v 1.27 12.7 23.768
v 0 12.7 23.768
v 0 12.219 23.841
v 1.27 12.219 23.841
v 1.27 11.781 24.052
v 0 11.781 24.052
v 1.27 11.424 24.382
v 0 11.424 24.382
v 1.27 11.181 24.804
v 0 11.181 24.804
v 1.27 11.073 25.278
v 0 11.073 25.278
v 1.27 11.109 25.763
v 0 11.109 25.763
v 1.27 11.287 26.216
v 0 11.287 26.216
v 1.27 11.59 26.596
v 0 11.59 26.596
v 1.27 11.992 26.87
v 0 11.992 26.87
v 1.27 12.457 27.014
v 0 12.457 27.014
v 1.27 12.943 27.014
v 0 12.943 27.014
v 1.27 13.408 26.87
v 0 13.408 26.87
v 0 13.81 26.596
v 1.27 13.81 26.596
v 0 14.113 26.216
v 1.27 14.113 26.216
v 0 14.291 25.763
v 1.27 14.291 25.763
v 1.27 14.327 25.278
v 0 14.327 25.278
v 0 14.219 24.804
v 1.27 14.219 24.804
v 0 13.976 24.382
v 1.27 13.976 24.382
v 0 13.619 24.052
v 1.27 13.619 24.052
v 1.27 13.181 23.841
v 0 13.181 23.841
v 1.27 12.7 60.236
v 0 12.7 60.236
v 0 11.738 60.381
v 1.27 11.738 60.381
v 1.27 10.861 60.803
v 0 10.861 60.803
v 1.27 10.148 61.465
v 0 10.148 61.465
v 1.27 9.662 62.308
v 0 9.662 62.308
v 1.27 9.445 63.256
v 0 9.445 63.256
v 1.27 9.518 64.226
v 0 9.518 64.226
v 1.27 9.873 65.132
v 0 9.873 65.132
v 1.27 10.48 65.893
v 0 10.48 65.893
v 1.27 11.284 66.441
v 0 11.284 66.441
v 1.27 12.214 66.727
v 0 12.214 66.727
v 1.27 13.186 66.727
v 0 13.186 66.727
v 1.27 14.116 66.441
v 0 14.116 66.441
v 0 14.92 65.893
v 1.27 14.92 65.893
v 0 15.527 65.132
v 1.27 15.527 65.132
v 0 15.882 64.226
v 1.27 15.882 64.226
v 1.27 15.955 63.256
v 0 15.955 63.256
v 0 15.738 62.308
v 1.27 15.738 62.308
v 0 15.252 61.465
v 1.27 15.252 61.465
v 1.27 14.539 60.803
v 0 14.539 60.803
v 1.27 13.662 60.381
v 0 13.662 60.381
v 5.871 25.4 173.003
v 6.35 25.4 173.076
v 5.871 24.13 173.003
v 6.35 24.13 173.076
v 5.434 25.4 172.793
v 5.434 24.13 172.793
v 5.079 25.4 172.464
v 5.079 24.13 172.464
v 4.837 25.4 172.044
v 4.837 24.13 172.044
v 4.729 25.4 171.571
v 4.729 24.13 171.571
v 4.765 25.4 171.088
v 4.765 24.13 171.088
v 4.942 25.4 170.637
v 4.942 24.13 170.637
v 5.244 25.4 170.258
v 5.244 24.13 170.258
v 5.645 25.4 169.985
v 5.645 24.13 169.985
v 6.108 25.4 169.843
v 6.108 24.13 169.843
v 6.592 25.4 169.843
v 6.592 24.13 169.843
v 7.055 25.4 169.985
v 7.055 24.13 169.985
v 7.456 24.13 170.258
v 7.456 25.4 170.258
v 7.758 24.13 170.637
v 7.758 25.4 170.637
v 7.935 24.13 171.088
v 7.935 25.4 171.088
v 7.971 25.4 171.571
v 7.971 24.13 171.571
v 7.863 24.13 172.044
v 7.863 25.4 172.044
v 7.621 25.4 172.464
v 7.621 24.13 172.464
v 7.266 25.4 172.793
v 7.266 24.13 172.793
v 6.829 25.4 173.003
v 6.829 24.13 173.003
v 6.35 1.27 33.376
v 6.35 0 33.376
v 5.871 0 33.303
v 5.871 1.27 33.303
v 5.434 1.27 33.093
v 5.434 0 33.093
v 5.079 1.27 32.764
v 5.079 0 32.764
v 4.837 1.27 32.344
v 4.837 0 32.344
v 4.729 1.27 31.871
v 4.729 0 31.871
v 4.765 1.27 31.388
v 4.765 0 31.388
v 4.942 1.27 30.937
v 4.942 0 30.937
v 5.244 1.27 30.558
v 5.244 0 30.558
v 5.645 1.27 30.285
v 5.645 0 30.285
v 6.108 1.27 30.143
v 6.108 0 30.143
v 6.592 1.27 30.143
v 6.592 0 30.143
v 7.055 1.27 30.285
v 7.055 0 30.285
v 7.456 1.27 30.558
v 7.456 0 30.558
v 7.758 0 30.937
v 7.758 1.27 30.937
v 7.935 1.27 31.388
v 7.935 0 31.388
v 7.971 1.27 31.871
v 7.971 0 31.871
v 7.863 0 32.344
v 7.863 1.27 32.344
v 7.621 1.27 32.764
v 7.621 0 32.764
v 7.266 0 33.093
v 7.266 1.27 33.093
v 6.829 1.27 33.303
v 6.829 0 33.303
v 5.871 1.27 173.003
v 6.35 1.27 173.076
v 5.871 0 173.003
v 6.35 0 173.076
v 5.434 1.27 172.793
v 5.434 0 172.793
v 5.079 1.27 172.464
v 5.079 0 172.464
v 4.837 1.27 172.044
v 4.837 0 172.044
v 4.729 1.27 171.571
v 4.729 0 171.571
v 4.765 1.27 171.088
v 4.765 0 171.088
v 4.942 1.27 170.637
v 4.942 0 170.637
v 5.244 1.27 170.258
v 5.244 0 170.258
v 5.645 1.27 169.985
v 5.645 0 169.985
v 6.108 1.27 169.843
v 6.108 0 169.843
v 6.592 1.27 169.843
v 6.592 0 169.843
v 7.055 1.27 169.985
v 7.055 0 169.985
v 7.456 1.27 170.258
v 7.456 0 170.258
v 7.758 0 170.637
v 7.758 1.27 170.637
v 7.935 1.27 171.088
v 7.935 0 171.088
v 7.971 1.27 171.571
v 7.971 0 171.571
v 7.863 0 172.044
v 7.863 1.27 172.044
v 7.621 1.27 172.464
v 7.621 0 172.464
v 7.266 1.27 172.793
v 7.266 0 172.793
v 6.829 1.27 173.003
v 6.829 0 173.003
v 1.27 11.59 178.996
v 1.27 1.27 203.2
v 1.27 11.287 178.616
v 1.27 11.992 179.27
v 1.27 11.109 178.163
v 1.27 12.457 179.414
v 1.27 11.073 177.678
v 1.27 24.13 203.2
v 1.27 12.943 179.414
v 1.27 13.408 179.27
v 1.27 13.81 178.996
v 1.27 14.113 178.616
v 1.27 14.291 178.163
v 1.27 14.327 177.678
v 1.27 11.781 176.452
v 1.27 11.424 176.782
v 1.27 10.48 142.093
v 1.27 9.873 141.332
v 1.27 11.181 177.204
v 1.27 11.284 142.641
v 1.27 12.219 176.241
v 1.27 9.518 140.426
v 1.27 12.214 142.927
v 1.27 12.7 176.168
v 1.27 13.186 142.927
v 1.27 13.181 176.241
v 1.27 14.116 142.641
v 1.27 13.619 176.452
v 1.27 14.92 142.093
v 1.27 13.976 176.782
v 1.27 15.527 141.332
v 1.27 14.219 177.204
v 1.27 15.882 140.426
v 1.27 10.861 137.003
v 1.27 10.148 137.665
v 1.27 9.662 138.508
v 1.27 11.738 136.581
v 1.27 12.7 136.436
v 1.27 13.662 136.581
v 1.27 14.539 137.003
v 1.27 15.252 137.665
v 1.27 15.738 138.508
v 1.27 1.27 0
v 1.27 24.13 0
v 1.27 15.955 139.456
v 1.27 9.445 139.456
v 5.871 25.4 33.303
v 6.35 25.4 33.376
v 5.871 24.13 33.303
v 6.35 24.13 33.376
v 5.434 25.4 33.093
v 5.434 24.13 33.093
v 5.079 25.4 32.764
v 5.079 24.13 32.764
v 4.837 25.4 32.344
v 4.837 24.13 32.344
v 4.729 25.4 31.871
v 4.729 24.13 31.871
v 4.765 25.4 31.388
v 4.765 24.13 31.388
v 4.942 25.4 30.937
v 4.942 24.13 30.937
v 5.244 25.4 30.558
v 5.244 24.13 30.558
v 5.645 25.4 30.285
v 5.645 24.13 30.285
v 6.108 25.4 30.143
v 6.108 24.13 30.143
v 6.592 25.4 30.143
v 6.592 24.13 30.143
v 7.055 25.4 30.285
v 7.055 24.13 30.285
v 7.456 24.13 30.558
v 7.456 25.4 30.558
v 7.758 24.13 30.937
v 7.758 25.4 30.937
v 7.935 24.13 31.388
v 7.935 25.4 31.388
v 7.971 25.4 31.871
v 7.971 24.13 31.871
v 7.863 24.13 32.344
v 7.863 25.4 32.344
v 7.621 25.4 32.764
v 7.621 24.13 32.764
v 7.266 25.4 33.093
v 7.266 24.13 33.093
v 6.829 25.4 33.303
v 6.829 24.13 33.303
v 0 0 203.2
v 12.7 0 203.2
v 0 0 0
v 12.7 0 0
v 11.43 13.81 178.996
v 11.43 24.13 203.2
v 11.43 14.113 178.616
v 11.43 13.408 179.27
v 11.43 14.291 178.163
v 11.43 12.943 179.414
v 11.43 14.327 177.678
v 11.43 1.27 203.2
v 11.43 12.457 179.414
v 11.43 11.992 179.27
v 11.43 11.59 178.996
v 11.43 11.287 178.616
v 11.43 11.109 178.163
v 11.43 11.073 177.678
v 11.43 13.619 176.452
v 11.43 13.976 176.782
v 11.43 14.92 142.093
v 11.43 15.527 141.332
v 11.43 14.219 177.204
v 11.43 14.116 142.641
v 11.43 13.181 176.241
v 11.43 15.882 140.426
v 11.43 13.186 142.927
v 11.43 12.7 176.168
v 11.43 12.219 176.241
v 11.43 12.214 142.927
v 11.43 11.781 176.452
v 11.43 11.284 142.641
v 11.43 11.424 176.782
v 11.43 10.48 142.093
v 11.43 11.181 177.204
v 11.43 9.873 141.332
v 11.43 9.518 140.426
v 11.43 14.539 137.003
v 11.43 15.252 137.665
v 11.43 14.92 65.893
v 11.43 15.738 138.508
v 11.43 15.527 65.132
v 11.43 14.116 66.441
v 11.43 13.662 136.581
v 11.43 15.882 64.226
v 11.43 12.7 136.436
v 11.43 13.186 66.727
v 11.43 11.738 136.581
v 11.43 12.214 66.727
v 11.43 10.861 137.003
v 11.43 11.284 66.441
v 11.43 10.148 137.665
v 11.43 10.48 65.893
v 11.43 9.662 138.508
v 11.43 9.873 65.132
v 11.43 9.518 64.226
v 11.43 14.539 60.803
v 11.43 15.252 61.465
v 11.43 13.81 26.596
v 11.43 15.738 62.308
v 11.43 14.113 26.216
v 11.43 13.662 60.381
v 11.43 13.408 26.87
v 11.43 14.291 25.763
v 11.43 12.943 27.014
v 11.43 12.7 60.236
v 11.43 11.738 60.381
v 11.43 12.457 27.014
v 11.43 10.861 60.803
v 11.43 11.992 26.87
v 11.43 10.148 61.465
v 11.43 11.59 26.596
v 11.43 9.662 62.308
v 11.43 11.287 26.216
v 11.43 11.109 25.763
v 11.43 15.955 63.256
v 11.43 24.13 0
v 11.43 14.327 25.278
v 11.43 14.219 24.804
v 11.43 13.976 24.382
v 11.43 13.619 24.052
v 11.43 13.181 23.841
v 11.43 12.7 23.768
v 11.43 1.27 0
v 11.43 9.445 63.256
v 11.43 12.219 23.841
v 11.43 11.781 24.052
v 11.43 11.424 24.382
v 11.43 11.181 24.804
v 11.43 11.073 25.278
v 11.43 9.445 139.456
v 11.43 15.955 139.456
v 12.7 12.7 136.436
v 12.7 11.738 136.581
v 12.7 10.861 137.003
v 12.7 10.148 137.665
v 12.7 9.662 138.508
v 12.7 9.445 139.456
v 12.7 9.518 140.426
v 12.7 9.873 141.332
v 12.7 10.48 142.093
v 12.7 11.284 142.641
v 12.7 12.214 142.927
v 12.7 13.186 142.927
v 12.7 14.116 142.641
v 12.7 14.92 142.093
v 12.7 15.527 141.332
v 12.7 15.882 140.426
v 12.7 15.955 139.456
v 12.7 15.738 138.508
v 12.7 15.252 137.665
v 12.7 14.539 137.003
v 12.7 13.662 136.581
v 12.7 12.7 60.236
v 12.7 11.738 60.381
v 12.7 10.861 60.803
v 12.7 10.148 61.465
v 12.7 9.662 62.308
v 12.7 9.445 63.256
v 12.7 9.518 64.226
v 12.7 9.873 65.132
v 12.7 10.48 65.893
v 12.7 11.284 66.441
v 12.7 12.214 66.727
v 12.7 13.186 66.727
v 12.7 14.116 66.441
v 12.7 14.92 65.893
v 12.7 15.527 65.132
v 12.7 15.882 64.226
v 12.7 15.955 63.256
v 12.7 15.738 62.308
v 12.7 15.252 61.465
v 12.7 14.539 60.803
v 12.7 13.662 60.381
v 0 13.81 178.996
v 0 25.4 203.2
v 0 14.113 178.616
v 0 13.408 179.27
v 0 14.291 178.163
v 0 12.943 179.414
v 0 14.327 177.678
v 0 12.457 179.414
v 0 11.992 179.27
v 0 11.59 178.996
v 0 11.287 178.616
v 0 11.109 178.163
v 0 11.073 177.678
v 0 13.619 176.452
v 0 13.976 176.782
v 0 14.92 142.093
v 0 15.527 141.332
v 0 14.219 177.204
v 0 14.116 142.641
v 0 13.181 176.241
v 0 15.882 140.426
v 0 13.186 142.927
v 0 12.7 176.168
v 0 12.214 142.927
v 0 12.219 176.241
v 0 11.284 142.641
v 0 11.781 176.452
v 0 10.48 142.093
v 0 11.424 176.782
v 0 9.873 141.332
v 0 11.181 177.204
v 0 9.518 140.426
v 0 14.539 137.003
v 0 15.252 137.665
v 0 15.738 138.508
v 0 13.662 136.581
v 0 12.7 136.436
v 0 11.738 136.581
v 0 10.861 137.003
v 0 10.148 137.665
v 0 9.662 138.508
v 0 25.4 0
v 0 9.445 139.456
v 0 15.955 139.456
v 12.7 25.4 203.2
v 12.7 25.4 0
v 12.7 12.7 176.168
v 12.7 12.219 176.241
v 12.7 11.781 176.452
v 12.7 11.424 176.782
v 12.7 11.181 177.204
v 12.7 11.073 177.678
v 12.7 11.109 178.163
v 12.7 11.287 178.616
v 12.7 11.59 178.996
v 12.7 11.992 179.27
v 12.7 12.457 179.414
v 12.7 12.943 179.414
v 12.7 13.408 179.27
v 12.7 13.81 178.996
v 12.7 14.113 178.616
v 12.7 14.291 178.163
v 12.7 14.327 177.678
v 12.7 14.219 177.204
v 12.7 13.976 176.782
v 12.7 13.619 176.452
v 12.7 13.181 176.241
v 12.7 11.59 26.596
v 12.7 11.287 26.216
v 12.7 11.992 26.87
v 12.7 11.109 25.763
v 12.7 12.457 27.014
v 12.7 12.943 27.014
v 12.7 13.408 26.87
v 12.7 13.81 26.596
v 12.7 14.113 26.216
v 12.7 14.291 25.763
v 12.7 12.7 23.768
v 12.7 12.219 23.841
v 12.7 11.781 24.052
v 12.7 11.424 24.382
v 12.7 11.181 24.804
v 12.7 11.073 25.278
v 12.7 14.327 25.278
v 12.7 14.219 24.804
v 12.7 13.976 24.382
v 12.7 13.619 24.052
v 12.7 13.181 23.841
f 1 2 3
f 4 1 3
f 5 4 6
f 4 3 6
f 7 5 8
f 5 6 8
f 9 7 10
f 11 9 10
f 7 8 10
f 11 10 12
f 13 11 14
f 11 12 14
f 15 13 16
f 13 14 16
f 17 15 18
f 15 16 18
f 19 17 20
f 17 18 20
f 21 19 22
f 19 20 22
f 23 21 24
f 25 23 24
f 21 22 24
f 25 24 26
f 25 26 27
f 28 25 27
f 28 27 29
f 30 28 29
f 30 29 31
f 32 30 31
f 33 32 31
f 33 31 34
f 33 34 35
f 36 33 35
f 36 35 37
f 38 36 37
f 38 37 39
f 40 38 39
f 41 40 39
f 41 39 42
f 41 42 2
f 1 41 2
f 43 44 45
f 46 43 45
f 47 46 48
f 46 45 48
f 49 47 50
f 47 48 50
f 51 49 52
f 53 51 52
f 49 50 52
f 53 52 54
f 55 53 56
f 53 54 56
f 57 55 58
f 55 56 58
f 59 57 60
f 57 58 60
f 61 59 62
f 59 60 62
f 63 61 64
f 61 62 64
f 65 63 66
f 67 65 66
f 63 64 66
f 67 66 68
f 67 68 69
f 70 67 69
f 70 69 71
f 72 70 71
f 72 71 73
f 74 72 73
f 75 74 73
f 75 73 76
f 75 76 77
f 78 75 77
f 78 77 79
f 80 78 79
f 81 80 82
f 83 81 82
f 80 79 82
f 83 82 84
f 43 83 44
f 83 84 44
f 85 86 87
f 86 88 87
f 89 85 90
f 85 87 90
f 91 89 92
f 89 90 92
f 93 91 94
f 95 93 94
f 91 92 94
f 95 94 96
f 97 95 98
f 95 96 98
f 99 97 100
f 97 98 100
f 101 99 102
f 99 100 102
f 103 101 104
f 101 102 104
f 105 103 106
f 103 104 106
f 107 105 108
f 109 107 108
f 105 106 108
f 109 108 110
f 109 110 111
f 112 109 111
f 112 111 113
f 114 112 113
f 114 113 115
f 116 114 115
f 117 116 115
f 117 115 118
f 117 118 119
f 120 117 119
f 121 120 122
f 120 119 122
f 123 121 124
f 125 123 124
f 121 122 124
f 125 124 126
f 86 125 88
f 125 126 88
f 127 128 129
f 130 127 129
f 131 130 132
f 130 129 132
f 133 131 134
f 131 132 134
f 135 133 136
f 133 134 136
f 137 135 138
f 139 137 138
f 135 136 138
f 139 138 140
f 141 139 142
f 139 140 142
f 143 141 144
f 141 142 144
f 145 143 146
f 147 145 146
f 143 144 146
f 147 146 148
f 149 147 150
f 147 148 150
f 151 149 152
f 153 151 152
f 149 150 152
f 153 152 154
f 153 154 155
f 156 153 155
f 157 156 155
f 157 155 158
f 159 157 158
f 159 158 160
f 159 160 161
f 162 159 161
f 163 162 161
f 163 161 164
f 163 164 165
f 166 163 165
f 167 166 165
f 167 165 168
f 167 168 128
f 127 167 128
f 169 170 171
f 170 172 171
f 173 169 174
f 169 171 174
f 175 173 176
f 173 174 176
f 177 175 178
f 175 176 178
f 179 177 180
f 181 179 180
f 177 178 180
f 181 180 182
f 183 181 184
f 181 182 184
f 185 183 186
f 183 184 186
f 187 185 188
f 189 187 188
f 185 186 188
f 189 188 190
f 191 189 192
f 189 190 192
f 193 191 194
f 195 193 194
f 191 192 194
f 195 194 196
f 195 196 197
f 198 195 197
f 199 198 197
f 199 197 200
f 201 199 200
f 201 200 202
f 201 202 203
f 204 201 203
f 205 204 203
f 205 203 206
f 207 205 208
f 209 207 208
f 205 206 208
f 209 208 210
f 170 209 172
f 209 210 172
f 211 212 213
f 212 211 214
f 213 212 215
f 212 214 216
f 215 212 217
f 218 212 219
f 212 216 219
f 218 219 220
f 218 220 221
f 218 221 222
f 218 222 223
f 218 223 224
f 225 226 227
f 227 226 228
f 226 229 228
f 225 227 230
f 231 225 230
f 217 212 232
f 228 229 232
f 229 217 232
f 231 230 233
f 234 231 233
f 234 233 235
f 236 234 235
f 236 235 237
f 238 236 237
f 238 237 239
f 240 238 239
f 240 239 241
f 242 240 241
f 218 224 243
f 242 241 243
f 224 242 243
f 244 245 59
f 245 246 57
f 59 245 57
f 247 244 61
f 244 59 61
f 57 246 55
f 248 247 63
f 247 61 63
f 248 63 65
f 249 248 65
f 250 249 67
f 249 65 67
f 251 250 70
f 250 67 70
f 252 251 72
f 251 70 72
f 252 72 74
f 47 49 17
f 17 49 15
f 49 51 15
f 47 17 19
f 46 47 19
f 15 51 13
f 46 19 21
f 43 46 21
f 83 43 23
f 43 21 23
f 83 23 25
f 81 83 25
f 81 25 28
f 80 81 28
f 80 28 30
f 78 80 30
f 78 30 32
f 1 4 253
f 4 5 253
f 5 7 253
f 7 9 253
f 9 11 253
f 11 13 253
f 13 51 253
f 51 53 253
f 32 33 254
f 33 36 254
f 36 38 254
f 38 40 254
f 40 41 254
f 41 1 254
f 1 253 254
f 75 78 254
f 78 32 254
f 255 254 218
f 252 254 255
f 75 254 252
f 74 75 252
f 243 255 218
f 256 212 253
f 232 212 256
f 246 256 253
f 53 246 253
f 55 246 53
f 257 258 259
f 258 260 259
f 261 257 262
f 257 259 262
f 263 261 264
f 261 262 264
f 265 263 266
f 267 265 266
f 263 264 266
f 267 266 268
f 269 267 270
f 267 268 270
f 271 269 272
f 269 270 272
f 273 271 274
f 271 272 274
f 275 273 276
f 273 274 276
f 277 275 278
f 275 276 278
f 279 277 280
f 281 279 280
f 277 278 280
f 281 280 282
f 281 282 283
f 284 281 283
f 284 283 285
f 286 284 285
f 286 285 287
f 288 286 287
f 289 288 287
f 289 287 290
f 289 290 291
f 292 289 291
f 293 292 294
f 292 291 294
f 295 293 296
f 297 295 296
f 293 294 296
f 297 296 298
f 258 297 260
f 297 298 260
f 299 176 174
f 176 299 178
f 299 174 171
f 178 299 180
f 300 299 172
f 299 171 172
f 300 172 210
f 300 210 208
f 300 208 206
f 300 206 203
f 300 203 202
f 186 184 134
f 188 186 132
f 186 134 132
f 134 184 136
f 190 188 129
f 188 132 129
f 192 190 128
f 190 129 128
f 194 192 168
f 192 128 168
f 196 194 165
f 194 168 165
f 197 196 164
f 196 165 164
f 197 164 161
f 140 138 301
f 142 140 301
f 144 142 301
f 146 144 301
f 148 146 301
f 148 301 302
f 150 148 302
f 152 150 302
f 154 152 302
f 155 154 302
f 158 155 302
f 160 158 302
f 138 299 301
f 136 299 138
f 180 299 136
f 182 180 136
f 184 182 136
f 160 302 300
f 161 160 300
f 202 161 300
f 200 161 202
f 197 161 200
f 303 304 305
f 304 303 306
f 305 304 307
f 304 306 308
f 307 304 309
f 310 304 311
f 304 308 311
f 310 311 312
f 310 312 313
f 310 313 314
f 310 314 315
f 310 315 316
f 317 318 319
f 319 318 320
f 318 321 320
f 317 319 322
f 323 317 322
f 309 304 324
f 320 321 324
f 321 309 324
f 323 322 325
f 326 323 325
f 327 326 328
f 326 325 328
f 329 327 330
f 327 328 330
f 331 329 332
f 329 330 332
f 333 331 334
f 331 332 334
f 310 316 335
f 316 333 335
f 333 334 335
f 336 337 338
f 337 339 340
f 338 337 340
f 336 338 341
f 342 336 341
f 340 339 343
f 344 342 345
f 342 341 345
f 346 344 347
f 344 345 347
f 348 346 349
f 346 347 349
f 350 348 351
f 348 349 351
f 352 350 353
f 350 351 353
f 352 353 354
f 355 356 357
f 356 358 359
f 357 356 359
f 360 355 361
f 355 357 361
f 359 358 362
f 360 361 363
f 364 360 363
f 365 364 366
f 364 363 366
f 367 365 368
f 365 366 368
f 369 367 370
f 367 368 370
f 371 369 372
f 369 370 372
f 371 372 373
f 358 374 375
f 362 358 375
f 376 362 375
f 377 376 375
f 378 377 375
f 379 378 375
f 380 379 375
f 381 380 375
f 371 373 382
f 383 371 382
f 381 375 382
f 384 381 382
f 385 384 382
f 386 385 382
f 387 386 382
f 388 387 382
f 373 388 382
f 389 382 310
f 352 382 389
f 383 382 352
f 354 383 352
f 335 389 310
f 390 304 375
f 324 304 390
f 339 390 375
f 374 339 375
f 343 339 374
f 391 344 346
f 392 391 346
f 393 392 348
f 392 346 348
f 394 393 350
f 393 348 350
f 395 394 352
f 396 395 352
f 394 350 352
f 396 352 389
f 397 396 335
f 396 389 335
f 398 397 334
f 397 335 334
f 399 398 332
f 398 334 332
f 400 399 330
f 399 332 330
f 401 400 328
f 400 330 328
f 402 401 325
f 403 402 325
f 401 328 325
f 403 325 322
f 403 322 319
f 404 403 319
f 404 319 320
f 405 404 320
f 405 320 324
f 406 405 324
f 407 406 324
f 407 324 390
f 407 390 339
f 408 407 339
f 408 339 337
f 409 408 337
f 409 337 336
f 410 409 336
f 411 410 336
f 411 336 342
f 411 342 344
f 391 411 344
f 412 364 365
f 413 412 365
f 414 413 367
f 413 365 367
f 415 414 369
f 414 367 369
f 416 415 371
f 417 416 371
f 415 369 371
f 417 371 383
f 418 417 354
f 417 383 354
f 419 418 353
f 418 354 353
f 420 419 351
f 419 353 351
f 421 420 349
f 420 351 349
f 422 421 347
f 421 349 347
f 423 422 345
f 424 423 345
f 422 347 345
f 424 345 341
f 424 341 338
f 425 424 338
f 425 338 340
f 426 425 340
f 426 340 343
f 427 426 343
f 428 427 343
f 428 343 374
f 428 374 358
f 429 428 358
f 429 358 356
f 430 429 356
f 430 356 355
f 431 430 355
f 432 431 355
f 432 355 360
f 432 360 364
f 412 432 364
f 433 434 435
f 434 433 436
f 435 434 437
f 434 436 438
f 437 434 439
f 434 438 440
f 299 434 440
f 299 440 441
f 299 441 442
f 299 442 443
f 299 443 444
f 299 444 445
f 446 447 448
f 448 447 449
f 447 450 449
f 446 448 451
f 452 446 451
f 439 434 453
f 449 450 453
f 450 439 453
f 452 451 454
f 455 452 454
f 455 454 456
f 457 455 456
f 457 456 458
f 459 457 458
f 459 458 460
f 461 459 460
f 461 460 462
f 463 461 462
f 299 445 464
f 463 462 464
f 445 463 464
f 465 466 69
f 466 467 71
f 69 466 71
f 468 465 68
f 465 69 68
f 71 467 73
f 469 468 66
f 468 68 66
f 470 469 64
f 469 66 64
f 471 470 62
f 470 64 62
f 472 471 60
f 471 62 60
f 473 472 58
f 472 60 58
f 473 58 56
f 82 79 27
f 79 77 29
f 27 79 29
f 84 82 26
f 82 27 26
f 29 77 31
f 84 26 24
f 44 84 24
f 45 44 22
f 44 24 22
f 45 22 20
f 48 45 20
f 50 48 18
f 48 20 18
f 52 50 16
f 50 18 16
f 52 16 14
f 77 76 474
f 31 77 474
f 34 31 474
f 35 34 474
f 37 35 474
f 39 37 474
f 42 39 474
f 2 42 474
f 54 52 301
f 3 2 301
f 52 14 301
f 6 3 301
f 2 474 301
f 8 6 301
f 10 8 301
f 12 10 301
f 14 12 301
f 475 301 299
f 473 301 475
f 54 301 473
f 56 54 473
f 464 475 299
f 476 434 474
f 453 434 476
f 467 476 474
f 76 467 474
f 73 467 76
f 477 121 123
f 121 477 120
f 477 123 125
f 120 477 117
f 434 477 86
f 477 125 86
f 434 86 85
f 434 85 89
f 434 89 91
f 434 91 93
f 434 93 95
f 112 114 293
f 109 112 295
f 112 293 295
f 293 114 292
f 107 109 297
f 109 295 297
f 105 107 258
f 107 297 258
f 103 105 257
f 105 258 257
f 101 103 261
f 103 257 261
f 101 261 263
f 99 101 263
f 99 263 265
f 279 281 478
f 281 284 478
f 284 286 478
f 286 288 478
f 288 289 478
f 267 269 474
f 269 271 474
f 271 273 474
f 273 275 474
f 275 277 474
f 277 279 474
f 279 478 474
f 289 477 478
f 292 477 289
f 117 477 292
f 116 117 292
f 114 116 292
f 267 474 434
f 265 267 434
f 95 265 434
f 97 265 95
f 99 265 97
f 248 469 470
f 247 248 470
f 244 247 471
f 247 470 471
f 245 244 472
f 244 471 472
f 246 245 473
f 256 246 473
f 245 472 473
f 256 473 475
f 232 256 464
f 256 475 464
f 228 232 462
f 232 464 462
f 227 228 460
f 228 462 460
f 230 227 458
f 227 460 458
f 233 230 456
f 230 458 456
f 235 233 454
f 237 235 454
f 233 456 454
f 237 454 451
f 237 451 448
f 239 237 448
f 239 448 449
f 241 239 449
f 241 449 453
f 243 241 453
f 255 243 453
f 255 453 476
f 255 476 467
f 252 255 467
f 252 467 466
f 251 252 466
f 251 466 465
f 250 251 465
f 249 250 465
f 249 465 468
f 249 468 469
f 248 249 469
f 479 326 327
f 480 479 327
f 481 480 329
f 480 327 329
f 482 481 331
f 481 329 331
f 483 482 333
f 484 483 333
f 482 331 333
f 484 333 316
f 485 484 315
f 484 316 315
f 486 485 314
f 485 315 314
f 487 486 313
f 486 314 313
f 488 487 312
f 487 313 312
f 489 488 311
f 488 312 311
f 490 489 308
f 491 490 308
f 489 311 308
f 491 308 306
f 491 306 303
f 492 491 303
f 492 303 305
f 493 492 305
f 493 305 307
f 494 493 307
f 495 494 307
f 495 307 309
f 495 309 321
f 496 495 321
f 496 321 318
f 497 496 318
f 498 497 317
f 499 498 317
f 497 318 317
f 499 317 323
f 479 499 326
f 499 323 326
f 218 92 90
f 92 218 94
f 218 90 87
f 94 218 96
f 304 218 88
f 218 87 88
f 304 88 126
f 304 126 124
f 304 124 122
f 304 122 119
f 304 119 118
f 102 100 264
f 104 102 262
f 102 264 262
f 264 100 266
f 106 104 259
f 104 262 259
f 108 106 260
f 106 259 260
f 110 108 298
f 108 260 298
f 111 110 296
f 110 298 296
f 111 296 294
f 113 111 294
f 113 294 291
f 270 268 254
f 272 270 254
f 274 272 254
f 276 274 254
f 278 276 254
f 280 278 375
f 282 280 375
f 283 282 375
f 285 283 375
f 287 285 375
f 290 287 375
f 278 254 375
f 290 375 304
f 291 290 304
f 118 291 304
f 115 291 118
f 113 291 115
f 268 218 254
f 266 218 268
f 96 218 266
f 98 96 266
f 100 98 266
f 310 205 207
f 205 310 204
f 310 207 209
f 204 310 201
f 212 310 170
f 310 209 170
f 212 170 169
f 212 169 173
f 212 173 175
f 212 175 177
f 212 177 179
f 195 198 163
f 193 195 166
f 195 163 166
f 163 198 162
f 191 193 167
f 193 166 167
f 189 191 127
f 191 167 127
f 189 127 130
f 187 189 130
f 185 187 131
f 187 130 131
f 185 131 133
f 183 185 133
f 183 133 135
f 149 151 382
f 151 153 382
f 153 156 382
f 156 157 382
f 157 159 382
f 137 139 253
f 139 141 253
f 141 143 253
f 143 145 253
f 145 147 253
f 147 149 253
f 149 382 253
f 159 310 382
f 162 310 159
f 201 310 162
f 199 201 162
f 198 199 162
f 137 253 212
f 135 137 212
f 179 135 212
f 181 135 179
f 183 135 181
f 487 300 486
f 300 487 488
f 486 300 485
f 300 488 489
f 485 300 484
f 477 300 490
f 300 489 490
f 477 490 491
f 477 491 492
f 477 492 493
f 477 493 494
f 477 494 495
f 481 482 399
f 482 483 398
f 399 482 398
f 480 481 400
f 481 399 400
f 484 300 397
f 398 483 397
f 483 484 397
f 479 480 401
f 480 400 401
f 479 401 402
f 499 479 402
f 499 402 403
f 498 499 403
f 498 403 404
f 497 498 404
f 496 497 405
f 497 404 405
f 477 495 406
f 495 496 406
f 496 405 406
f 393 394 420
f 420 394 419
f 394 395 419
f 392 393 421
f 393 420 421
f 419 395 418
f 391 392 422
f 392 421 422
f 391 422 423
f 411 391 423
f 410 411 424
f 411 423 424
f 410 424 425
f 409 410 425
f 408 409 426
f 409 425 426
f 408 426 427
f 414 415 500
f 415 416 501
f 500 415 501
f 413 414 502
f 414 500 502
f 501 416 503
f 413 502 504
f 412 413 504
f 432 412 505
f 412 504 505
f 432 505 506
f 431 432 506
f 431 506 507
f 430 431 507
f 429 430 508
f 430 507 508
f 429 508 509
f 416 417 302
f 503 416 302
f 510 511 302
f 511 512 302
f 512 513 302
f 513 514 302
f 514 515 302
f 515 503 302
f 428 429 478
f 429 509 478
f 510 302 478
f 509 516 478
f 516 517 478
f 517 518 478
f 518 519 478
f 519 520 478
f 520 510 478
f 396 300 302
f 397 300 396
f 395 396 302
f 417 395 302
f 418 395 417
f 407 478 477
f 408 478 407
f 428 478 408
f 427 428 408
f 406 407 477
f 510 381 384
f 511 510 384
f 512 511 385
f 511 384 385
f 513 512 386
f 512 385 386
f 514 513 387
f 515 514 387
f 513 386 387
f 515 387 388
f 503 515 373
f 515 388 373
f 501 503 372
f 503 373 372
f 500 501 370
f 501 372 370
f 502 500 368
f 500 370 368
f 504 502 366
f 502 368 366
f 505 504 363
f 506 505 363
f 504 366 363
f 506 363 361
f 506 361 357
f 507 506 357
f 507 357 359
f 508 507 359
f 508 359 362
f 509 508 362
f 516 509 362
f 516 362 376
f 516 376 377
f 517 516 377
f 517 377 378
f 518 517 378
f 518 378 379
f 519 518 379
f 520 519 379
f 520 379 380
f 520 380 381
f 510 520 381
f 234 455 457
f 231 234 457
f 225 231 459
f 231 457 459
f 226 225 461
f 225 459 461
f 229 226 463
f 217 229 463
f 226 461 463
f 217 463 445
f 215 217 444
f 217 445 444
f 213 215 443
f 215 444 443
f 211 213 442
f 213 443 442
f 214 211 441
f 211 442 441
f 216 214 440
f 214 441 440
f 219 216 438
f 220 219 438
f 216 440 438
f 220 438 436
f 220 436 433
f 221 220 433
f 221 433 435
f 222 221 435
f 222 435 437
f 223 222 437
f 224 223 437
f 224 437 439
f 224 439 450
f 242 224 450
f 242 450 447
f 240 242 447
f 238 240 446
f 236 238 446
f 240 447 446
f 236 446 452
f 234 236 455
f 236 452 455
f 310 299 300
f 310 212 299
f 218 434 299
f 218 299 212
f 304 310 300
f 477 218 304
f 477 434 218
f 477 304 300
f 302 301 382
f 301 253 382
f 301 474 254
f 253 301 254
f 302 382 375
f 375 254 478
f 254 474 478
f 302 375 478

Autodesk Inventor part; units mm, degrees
ref_plane "YZ Plane" through (0, 0, 0) normal (1, 0, 0) x (0, 1, 0)
ref_plane "XZ Plane" through (0, 0, 0) normal (0, 1, 0) x (-1, 0, 0)
ref_plane "XY Plane" through (0, 0, 0) normal (0, 0, 1) x (1, 0, 0)
sketch "Sketch1" plane through (0, 0, 0) normal (0, 0, 1) x (1, 0, 0)
  line L0 (0, 0) -> (12.7, 0)
  line L1 (12.7, 0) -> (12.7, 25.4)
  line L2 (12.7, 25.4) -> (0, 25.4)
  line L3 (0, 25.4) -> (0, 0)
  line L4 (1.27, 24.13) -> (11.43, 24.13)
  line L5 (11.43, 24.13) -> (11.43, 1.27)
  line L6 (11.43, 1.27) -> (1.27, 1.27)
  line L7 (1.27, 1.27) -> (1.27, 24.13)
  dimension "d0" = 25.4
  dimension "d1" = 12.7
  dimension "d2" = 1.27
extrude "Extrusion1" add sketch "Sketch1" along normal blind 203.2
sketch "Sketch2" plane through (12.7, 0, 0) normal (1, 0, 0) x (0, 0, -1)
  line L0 (-168.1044, 12.7) -> (-15.152, 12.7) construction
  line L1 (0, 0) -> (-203.2, 0) construction
  line L2 (-203.2, 0) -> (-203.2, 25.4) projected
  line L3 (0, 0) -> (0, 25.4) projected
  point P0 (-177.8, 12.7)
  point P1 (-25.4, 12.7)
  dimension "d5" = 12.7
  dimension "d6" = 25.4
  dimension "d7" = 25.4
hole "Hole1" at (12.7, 12.7, 177.8) at (12.7, 12.7, 25.4) direction (-1, 0, 0) diameter 3.2639 end through all
sketch "Sketch3" plane through (12.7, 0, 0) normal (1, 0, 0) x (0, 0, -1)
  circle A0 centre (-177.8, 12.7) radius 1.632 projected
  circle A1 centre (-25.4, 12.7) radius 1.632 projected
  line L0 (-214.4228, 12.7) -> (16.7128, 12.7) construction
  point P0 (0, 0)
  point P1 (-139.7, 12.7)
  point P2 (-63.5, 12.7)
  dimension "d18" = 38.1
  dimension "d19" = 38.1
hole "Hole2" at (12.7, 12.7, 139.7) at (12.7, 12.7, 63.5) direction (-1, 0, 0) diameter 6.5278 end through all
sketch "Sketch4" plane through (0, 25.4, 0) normal (0, 1, 0) x (1, 0, 0)
  line L0 (6.35, 23.2485) -> (6.35, -226.9955) construction
  line L1 (12.7, 0) -> (12.7, -203.2) construction
  line L2 (12.7, 0) -> (0, 0) projected
  line L3 (0, 0) -> (0, -203.2) projected
  line L4 (12.7, -203.2) -> (0, -203.2) projected
  line L5 (12.7, 0) -> (12.7, -203.2) projected
  point P0 (0, 0)
  point P1 (6.35, -31.75)
  point P2 (6.35, -171.45)
  dimension "d27" = 6.35
  dimension "d28" = 31.75
  dimension "d29" = 31.75
hole "Hole3" at (6.35, 25.4, 31.75) at (6.35, 25.4, 171.45) direction (0, -1, 0) diameter 3.2512 end through all
properties part number "000101"
